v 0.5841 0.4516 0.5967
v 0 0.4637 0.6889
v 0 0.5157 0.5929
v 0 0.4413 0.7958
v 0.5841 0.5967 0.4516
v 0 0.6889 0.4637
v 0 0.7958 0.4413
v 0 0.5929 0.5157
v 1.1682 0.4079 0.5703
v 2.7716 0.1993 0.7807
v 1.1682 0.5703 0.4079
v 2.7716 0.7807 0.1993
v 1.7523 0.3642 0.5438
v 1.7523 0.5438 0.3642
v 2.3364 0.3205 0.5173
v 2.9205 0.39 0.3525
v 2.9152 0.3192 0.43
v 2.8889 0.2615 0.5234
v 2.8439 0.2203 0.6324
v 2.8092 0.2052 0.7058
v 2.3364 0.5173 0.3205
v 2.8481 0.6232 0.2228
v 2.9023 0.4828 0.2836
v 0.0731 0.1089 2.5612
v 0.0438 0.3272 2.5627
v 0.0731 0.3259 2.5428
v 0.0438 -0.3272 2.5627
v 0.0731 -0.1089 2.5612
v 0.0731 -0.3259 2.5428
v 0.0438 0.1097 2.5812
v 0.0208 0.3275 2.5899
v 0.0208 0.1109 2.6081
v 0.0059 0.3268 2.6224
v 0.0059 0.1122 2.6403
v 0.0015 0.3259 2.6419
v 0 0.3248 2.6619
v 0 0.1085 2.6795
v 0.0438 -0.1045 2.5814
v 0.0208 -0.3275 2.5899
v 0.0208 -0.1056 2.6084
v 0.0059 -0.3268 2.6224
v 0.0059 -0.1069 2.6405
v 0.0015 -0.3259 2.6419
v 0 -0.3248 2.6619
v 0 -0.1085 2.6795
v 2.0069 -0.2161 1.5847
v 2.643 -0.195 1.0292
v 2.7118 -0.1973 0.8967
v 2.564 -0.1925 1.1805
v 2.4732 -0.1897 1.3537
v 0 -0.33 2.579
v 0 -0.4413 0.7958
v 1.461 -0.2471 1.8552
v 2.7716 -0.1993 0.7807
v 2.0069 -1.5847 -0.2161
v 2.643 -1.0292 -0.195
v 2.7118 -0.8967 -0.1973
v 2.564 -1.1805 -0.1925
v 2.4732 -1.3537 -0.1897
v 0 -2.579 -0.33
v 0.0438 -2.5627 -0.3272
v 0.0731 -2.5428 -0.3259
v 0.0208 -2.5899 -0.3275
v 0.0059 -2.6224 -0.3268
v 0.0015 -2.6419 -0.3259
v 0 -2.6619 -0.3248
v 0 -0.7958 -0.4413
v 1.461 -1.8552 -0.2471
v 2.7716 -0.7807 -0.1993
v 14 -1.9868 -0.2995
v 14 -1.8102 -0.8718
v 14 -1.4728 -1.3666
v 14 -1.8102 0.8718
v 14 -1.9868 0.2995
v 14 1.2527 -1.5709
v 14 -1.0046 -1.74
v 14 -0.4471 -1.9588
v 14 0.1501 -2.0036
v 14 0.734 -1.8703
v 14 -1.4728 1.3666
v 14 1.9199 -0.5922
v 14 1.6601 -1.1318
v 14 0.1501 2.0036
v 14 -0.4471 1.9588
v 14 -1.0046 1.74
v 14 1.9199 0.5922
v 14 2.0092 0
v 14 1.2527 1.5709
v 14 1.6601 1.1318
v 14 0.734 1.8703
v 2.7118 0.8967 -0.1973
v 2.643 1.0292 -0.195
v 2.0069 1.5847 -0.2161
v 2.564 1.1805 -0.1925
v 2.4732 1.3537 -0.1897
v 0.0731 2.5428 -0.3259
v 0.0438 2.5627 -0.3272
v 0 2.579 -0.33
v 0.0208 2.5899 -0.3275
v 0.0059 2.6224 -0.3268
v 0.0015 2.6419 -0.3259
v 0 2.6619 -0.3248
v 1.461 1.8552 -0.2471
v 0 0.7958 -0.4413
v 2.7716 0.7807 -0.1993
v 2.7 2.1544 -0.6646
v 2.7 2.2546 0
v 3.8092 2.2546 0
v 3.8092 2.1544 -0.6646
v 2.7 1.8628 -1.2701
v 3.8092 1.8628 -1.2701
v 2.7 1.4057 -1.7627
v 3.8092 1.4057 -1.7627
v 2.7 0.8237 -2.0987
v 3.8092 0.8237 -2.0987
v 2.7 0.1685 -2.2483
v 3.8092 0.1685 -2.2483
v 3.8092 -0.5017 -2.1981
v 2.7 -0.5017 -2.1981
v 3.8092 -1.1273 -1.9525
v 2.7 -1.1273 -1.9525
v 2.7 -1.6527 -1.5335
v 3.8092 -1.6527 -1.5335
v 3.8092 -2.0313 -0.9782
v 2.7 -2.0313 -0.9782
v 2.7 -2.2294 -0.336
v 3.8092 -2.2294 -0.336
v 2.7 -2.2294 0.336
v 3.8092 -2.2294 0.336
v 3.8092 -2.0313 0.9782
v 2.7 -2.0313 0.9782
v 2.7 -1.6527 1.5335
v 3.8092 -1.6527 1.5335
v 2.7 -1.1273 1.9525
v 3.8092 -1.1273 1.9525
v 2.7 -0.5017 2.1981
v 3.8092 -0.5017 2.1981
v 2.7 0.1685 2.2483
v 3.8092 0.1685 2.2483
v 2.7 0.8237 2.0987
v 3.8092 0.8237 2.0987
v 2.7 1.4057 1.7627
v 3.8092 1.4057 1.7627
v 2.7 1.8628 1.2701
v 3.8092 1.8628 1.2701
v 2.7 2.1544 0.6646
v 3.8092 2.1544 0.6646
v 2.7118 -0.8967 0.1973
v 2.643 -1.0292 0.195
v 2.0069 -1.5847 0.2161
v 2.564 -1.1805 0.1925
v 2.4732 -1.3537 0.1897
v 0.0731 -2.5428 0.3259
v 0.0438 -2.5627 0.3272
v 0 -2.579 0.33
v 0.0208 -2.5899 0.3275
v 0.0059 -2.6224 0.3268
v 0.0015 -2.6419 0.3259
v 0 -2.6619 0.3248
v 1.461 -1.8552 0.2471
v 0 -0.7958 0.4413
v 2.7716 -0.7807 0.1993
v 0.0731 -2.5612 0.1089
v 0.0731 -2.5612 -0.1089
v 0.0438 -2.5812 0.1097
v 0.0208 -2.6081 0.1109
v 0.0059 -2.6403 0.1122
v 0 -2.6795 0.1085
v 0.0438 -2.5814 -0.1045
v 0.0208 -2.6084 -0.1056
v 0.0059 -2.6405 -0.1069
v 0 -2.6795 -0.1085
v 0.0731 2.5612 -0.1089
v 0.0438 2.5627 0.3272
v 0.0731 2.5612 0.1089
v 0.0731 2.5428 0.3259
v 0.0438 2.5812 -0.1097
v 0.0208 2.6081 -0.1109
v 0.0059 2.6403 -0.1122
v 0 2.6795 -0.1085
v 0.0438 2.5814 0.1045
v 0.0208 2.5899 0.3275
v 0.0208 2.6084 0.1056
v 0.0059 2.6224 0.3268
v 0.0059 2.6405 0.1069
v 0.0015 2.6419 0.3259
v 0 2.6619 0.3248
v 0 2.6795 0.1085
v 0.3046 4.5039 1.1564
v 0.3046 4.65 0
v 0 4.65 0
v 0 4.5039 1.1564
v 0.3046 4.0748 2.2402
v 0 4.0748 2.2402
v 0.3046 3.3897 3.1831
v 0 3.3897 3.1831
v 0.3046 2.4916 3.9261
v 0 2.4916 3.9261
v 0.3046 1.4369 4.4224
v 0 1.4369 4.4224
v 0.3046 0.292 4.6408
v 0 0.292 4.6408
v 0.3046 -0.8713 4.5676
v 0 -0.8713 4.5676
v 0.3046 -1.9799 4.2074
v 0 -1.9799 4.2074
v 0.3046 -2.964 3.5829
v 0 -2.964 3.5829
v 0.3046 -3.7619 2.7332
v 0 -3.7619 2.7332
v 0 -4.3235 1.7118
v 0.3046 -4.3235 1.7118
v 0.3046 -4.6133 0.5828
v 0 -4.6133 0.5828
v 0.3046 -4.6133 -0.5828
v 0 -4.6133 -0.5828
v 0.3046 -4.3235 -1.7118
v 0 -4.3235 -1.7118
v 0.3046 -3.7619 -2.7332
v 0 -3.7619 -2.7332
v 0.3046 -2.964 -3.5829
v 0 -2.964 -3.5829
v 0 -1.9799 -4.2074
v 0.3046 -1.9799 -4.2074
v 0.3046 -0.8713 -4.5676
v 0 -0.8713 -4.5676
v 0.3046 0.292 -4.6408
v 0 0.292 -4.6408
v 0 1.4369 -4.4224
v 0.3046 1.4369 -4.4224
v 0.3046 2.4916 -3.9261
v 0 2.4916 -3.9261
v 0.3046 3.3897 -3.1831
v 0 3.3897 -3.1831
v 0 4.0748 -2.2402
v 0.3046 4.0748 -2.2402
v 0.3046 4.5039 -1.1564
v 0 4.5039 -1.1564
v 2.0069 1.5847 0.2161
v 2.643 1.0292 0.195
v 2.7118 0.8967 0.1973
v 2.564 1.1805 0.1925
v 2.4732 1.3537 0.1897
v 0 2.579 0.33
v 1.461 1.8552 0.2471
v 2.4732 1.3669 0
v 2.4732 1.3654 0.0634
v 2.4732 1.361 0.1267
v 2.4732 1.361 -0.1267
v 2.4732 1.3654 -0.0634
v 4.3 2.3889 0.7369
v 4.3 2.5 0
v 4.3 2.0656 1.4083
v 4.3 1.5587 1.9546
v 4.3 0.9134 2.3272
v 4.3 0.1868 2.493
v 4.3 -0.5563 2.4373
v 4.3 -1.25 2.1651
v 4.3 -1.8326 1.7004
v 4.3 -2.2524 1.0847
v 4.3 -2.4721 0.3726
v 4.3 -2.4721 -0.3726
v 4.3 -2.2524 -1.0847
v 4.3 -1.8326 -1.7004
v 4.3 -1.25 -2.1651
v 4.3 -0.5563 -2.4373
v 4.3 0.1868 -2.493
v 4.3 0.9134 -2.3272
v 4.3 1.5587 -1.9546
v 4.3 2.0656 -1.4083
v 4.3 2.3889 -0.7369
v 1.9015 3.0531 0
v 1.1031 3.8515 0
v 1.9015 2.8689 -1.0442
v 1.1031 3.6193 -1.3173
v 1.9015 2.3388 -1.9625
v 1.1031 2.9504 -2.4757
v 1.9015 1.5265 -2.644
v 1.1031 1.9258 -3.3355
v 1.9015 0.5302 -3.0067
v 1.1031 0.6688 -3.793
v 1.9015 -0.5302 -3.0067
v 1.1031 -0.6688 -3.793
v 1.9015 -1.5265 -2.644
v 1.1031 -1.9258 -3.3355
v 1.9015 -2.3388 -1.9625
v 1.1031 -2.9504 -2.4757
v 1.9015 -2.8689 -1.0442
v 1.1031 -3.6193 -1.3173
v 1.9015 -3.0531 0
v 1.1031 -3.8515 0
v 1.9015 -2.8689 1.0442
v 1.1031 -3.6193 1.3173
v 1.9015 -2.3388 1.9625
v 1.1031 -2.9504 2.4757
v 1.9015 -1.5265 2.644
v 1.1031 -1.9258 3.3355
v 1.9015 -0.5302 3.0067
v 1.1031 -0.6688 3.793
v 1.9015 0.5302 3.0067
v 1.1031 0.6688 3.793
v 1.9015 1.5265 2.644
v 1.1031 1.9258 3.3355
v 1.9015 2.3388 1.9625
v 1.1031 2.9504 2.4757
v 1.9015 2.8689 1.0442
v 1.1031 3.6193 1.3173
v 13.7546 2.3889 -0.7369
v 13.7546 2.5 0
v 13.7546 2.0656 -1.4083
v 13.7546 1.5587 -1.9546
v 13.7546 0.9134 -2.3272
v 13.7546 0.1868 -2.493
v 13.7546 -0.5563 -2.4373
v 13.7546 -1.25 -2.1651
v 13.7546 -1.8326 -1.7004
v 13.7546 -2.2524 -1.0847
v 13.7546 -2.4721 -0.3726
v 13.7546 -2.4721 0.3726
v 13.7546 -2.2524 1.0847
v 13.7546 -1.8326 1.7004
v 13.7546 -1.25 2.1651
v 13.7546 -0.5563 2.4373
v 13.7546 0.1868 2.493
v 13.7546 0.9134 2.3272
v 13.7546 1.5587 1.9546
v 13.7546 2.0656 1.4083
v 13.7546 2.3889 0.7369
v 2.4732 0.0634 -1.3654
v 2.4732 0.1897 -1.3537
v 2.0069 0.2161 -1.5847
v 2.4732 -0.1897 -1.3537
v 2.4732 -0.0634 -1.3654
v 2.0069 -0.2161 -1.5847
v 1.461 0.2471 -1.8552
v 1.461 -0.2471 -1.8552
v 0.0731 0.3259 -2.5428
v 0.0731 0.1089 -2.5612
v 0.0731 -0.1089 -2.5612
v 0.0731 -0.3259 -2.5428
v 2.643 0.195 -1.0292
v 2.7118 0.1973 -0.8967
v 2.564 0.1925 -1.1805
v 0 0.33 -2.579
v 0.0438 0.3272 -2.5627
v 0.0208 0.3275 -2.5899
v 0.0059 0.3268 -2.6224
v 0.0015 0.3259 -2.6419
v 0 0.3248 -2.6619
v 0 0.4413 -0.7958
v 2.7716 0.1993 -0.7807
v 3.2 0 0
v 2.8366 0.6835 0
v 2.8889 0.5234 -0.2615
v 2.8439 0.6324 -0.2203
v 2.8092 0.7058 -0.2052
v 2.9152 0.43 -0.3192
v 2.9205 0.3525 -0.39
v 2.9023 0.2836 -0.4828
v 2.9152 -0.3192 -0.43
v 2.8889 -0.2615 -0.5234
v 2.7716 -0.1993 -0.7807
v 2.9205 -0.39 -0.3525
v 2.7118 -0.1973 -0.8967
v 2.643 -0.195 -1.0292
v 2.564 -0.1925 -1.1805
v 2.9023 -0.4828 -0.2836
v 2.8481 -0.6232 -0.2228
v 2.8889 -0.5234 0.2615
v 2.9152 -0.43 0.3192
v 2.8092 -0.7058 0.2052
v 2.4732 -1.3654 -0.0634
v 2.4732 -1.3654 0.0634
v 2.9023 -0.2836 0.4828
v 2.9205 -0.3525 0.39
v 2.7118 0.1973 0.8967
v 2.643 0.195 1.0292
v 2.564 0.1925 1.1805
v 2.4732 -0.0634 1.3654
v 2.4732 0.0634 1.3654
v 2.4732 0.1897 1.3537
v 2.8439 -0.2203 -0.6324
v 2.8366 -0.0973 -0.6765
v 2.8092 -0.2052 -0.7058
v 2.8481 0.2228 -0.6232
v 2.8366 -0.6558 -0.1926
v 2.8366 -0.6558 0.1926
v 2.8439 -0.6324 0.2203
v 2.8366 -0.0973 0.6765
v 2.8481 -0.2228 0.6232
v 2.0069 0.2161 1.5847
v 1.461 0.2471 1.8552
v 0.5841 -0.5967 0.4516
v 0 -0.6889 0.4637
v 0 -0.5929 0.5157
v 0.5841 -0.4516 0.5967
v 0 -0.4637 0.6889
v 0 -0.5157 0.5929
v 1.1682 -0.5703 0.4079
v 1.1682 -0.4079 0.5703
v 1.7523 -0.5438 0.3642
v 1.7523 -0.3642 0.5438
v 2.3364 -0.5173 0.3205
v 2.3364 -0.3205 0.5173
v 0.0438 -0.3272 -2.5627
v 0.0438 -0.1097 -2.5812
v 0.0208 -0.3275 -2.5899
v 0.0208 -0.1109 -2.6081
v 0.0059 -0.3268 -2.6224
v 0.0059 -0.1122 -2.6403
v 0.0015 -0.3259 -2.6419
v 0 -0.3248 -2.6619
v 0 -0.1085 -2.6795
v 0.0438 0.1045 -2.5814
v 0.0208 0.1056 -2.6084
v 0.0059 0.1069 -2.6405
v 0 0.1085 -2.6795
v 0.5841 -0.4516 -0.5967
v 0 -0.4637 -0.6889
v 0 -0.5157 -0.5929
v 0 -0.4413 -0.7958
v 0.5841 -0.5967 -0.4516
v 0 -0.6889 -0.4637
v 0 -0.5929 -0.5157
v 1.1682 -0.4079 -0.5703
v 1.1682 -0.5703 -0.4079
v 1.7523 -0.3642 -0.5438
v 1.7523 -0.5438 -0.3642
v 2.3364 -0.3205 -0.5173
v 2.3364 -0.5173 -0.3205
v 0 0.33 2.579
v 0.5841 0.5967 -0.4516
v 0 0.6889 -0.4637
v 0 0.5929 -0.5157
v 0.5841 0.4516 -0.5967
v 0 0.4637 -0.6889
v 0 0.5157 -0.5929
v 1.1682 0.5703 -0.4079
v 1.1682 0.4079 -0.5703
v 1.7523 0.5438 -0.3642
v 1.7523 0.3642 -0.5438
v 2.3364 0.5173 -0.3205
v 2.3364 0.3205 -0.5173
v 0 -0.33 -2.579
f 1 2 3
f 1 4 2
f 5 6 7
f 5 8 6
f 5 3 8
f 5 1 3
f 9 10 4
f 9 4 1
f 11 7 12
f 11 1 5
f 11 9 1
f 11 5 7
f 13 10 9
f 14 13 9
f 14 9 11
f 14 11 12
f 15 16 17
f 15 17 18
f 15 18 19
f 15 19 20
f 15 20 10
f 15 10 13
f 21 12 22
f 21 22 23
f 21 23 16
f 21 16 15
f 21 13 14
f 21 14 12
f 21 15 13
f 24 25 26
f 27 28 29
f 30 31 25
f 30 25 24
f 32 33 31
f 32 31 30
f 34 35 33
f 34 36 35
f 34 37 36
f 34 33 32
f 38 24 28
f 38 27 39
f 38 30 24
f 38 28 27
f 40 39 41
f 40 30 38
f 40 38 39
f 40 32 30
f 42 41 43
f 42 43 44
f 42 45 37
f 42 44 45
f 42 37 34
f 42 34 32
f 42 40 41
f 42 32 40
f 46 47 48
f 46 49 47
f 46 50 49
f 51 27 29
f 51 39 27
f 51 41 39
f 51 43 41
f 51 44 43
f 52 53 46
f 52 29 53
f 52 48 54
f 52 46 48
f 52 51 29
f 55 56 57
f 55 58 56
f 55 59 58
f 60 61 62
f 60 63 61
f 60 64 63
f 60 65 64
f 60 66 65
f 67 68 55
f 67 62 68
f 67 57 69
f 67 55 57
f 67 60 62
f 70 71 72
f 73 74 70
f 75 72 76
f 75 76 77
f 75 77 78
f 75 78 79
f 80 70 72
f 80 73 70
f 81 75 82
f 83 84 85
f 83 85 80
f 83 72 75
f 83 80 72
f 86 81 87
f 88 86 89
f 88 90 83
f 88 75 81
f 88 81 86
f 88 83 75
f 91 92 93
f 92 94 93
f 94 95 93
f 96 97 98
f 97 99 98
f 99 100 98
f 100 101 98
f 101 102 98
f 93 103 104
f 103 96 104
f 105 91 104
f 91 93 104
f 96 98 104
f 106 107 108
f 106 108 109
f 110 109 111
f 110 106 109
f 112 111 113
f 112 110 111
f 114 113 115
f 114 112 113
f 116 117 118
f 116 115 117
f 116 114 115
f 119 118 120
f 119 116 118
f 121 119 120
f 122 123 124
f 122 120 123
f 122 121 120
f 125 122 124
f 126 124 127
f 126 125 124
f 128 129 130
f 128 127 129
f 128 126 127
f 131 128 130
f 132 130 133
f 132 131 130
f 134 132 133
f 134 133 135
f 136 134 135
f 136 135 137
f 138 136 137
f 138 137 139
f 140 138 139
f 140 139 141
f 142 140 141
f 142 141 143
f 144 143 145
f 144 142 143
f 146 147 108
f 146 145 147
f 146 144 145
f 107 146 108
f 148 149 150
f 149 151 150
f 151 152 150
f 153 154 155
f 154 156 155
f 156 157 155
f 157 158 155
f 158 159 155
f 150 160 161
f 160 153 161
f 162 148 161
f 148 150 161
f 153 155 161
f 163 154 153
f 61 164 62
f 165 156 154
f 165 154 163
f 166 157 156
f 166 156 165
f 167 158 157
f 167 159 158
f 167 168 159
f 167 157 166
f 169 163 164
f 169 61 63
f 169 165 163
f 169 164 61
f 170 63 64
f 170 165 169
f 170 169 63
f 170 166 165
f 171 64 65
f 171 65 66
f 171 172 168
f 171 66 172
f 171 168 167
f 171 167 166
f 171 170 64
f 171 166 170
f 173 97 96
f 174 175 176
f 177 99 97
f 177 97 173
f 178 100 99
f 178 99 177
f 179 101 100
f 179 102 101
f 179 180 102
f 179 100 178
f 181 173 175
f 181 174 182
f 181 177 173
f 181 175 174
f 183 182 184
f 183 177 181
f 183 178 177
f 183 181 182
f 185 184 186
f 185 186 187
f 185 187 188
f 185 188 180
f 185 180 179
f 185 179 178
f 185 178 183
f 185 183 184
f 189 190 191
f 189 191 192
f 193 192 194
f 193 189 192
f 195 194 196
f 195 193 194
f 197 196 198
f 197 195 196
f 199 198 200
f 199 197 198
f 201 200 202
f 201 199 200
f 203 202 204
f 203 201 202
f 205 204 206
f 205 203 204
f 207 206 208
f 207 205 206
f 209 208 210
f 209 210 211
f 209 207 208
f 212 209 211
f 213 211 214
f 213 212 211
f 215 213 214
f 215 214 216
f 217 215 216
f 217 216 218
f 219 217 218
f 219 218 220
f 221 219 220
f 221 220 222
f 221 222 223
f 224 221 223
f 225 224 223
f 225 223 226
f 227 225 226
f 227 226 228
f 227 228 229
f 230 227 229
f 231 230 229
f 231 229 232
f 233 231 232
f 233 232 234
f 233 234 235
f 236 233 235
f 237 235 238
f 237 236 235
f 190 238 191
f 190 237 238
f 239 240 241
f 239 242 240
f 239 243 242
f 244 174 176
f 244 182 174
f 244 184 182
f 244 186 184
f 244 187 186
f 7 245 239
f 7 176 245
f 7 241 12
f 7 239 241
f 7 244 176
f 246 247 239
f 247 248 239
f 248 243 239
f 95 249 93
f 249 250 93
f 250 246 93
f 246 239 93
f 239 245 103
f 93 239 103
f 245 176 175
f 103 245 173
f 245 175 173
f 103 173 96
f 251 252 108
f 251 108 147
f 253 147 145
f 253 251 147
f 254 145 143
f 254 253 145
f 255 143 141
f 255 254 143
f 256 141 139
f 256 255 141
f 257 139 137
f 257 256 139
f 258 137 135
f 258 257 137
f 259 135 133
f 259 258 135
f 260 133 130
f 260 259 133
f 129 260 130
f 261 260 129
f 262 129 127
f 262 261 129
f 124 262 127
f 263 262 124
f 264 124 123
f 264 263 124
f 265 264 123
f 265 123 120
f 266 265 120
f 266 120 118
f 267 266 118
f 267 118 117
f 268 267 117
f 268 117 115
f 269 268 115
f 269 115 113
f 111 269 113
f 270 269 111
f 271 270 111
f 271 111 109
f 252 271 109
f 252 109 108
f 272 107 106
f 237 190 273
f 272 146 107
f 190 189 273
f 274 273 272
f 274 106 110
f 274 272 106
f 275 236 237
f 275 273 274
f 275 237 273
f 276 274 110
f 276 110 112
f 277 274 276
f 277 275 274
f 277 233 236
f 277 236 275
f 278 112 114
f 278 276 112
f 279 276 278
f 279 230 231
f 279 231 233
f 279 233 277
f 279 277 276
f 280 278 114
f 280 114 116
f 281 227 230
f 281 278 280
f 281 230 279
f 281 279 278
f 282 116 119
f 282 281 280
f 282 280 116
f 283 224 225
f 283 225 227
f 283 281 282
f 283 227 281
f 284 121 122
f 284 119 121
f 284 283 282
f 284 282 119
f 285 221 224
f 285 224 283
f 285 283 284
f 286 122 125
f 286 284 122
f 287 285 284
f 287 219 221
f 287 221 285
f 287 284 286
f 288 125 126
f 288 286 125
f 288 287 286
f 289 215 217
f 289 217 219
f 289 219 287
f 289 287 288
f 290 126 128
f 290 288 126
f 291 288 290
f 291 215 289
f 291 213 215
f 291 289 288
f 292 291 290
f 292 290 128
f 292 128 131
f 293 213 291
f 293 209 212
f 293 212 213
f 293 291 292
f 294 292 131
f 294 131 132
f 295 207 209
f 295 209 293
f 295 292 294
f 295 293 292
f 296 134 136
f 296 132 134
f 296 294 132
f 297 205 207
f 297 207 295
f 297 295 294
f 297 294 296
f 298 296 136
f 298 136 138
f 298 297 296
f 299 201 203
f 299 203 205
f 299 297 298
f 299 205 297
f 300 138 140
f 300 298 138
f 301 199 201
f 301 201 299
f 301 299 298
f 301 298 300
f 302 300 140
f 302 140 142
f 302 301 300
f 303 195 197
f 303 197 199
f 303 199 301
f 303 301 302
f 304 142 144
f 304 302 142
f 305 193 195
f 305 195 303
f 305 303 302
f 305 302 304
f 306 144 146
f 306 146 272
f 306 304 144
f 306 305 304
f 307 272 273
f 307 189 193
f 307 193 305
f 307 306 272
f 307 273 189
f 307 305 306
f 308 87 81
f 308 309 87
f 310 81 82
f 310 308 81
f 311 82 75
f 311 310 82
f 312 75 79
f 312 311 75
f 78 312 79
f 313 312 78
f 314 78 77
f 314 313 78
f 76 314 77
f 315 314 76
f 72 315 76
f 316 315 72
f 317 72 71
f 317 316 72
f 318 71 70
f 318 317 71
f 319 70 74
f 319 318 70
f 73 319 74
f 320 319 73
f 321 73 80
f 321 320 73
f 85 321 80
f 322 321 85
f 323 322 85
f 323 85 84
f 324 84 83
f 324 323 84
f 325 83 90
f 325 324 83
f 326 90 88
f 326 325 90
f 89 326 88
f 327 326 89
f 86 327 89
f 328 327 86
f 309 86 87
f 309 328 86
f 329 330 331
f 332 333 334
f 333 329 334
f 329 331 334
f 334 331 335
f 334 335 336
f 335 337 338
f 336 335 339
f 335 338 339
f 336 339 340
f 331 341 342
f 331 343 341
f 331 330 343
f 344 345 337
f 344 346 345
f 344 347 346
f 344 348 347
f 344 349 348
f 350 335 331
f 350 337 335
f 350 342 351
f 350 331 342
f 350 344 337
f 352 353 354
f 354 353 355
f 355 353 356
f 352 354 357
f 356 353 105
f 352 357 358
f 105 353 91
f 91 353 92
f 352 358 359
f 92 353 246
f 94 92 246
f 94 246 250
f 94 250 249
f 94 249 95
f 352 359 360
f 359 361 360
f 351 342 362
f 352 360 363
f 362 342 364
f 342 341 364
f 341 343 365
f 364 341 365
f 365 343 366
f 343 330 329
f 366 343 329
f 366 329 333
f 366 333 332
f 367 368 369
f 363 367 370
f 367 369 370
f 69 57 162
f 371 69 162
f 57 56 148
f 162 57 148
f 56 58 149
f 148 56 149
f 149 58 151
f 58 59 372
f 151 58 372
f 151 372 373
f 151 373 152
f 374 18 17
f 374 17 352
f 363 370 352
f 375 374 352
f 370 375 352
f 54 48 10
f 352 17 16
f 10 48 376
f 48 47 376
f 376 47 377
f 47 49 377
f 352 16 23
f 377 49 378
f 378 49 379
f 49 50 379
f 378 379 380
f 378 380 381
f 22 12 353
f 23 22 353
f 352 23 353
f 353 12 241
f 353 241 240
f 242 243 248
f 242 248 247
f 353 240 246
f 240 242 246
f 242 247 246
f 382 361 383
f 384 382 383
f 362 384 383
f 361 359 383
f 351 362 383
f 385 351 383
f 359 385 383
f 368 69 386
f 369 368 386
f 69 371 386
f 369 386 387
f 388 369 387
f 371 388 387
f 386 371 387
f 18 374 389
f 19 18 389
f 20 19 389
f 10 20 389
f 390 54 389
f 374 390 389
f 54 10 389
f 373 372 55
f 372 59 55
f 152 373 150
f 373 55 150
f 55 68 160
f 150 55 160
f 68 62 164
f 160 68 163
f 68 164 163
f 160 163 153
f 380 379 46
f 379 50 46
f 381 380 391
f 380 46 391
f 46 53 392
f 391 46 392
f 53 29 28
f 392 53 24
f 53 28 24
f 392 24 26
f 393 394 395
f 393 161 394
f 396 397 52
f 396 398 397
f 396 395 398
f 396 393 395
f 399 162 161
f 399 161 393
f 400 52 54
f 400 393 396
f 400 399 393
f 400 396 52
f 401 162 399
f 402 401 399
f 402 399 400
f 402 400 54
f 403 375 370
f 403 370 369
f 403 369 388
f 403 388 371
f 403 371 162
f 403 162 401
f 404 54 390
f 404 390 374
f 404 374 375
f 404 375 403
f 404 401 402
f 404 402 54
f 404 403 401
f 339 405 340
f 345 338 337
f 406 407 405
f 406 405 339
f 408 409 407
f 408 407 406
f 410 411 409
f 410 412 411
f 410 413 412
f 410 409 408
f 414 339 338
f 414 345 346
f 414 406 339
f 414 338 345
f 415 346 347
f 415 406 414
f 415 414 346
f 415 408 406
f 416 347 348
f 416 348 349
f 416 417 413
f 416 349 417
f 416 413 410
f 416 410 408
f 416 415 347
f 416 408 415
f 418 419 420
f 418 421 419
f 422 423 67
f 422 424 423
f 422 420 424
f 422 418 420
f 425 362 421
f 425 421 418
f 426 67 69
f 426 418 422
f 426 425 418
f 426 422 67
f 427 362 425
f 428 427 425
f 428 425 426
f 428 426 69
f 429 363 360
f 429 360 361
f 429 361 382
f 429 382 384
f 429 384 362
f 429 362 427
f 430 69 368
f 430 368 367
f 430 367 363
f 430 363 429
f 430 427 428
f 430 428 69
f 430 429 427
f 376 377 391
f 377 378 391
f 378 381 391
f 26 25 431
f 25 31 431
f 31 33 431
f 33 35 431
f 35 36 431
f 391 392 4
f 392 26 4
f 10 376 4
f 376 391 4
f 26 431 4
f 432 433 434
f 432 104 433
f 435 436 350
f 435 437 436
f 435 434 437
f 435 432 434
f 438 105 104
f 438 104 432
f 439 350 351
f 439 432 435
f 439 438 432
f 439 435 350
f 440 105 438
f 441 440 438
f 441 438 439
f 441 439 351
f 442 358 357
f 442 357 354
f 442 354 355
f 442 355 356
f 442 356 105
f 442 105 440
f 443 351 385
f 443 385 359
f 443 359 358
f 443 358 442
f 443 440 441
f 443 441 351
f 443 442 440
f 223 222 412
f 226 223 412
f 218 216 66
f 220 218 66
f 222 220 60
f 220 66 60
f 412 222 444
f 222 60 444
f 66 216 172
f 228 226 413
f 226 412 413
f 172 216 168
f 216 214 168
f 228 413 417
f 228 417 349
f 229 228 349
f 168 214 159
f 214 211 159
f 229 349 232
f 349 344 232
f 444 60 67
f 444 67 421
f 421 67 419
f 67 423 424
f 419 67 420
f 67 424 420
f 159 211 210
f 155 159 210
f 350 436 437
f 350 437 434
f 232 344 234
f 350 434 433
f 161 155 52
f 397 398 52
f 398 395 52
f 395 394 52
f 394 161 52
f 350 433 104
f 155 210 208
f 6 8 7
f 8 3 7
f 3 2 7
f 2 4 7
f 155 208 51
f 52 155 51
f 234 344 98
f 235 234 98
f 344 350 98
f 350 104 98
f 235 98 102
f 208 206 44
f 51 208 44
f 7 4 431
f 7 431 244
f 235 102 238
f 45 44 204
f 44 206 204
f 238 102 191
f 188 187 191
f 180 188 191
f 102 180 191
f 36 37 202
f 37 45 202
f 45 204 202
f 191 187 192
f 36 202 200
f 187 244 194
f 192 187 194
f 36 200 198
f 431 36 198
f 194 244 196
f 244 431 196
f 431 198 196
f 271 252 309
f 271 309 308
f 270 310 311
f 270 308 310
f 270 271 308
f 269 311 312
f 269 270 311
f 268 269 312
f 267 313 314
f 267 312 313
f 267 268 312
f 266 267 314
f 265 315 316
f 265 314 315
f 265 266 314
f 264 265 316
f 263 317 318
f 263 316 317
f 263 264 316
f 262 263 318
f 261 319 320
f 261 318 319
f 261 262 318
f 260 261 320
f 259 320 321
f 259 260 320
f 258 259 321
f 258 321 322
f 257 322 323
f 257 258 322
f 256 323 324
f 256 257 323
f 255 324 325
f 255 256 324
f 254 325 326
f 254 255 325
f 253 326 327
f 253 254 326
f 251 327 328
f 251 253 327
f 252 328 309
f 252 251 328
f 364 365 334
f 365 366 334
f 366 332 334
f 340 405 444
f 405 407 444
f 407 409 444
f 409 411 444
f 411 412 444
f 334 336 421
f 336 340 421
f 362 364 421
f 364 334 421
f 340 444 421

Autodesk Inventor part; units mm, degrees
ref_plane "YZ Plane" through (0, 0, 0) normal (1, 0, 0) x (0, 1, 0)
ref_plane "XZ Plane" through (0, 0, 0) normal (0, 1, 0) x (-1, 0, 0)
sketch "Sketch1" plane through (0, 0, 0) normal (0, 0, 1) x (1, 0, 0)
  line L0 (3.2, 0) -> (14, 0)
  line L1 (14, 0) -> (14, 2.5)
  line L2 (14, 2.5) -> (4.3, 2.5)
  line L3 (4.3, 2.5) -> (3.8092, 2.2546)
  line L4 (3.8092, 2.2546) -> (2.7, 2.2546)
  line L5 (0, 4.65) -> (0, 2.6)
  line L6 (0, 2.6) -> (2.4732, 1.3669)
  line L7 (2.4732, 1.3669) -> (3.2, 0)
  line L8 (-2.8, 0) -> (16.8, 0) projected
  line L9 (0, -0.93) -> (0, 5.58) projected
  line L10 (0, 4.65) -> (0.3046, 4.65)
  line L11 (0.3046, 4.65) -> (2.7, 2.2546)
  line L12 (4.3, 2.5) -> (2.4546, 2.5) construction
  dimension "d1" = 9.7
  dimension "d2" = 5
  dimension "d3" = 4.5092
  dimension "d4" = 5.2
  dimension "d5" = 26.5
  dimension "d6" = 62
  dimension "d7" = 3.2
  dimension "d8" = 0.4908
  dimension "d12" = 9.3
  dimension "d13" = 45
  dimension "d15" = 14
  dimension "d24" = 2.7
revolve "Body" add sketch "Sketch1" angle 360 about axis through (3.2, 0, 0) along (1, 0, 0) contours L7 L6 L5 L10 L11 L4 L3 L2 L1 L0
sketch "Sketch2" plane through (0, 0, 0) normal (-1, 0, 0) x (0, 0, 1)
  line L0 (0, 2.6) -> (0, 0) construction
  line L1 (0, 0) -> (2.6, 0) construction
  arc A0 (0.78, 0) -> (0, 0.78) centre (0, 0) ccw construction
  arc A1 (0.91, 0) -> (0, 0.91) centre (0, 0) ccw construction
  arc A2 (2.579, 0.33) -> (0.33, 2.579) centre (0, 0) ccw
  line L2 (0, 0) -> (1.8385, 1.8385) construction
  line L3 (0.33, 2.579) -> (0.4413, 0.7958)
  line L4 (2.579, 0.33) -> (0.7958, 0.4413)
  arc A3 (0.33, 2.579) -> (0, 2.6) centre (0, 0) ccw
  arc A4 (2.6, 0) -> (2.579, 0.33) centre (0, 0) ccw
  line L5 (0, -6.51) -> (0, 6.51) projected
  line L6 (-6.51, 0) -> (6.51, 0) projected
  arc A5 (0.33, -2.579) -> (2.579, -0.33) centre (0, 0) ccw
  line L7 (0.33, -2.579) -> (0.4413, -0.7958)
  line L8 (2.579, -0.33) -> (0.7958, -0.4413)
  arc A6 (0, -2.6) -> (0.33, -2.579) centre (0, 0) ccw
  arc A7 (2.579, -0.33) -> (2.6, 0) centre (0, 0) ccw
  arc A8 (-0.33, 2.579) -> (-2.579, 0.33) centre (0, 0) ccw
  line L9 (-0.33, 2.579) -> (-0.4413, 0.7958)
  line L10 (-2.579, 0.33) -> (-0.7958, 0.4413)
  arc A9 (0, 2.6) -> (-0.33, 2.579) centre (0, 0) ccw
  arc A10 (-2.579, 0.33) -> (-2.6, 0) centre (0, 0) ccw
  arc A11 (-0.33, -2.579) -> (0, -2.6) centre (0, 0) ccw
  arc A12 (-2.579, -0.33) -> (-0.33, -2.579) centre (0, 0) ccw
  arc A13 (-2.6, 0) -> (-2.579, -0.33) centre (0, 0) ccw
  line L11 (-2.579, -0.33) -> (-0.7958, -0.4413)
  line L12 (-0.33, -2.579) -> (-0.4413, -0.7958)
  arc A14 (0.4413, 0.7958) -> (0.7958, 0.4413) centre (0.8194, 0.8194) ccw
  arc A15 (0.7958, -0.4413) -> (0.4413, -0.7958) centre (0.8194, -0.8194) ccw
  arc A16 (-0.7958, 0.4413) -> (-0.4413, 0.7958) centre (-0.8194, 0.8194) ccw
  arc A17 (-0.4413, -0.7958) -> (-0.7958, -0.4413) centre (-0.8194, -0.8194) ccw
  point P0 (1.8385, -1.8385)
  point P1 (-1.8385, 1.8385)
  point P2 (-1.8385, -1.8385)
  dimension "d17" = 1.56
  dimension "d18" = 1.82
  dimension "d19" = 5.2
  dimension "d20" = 45
  dimension "d21" = 0.33
extrude "Slot" add sketch "Sketch2" against normal up to next draft 5 contours L4 A14 L3 A2 | A5 L7 A15 L8 | L9 A16 L10 A8 | A12 L11 A17 L12
fillet "Fillet1" radius 0.132 4 edges at (0, 2.6, 0) (0, 0, -2.6) (0, -2.6, 0) (0, 0, 2.6)
thread "Thread" size "M5x0.8" class "6g" standard "ISO Metric profile" length 9.7
chamfer "Chamfer1" distance 0.4908 distance2 0.2454 1 edges at (14, -2.5, 0) measured on face at (14, 0.1959, -0.44)
ref_plane "Work Plane2" through (3.35, 0, 0) normal (0, 0, -1) x (1, 0, 0)
equation "\"d1\" = GEL"
equation "\"d2\" = GD"
equation "\"d3\" = BDM"
equation "\"d4\" = SDM"
equation "\"d7\" = INTI"
equation "\"d8\" = GAL"
equation "\"d12\" = KOD"
equation "\"d13\" = 0.5 * SEWI"
equation "\"d15\" = NLG"
equation "\"d24\" = KOH"
equation "\"d17\" = 0.3 * SDM"
equation "\"d18\" = 0.35 * SDM"
equation "\"d19\" = SDM"
equation "\"d21\" = 0.5 * SBR"
equation "\"d23\" = 0.2 * SBR"
equation "\"d10\" = GEL"
equation "\"d25\" = -0.5 * SPD + 0.5 * GD"
equation "\"d26\" = 0.5 * GAL"
equation "\"NLG\" = 14"
equation "\"GEL\" = 9.7"
equation "\"GAL\" = 0.61345 * PTC"
equation "\"SPD\" = NND - 1.2269 * PTC"
equation "\"KOD\" = 9.3"
equation "\"KOH\" = 2.7"
equation "\"SBR\" = 0.66"
equation "\"INTI\" = 3.2"
equation "\"SDM\" = 5.2"
equation "\"GD\" = NND"
equation "\"BDM\" = NND - GAL"
equation "\"SEWI\" = 90deg"
equation "\"d9\" = SDM"
equation "\"GUL\" = 0.61345 * PTC"
equation "\"TOA\" = 30deg"
equation "\"EPV\" = 5.2"
equation "\"THREADDIA\" = 5"
equation "\"PTC\" = 0.8"
equation "\"NND\" = 5"
equation "\"GD1\" = THREADDIA - 1.2269 * PTC"
properties part number "ISO 7046-1 - M5 x 14 - 4.8 - H" material "Steel"
